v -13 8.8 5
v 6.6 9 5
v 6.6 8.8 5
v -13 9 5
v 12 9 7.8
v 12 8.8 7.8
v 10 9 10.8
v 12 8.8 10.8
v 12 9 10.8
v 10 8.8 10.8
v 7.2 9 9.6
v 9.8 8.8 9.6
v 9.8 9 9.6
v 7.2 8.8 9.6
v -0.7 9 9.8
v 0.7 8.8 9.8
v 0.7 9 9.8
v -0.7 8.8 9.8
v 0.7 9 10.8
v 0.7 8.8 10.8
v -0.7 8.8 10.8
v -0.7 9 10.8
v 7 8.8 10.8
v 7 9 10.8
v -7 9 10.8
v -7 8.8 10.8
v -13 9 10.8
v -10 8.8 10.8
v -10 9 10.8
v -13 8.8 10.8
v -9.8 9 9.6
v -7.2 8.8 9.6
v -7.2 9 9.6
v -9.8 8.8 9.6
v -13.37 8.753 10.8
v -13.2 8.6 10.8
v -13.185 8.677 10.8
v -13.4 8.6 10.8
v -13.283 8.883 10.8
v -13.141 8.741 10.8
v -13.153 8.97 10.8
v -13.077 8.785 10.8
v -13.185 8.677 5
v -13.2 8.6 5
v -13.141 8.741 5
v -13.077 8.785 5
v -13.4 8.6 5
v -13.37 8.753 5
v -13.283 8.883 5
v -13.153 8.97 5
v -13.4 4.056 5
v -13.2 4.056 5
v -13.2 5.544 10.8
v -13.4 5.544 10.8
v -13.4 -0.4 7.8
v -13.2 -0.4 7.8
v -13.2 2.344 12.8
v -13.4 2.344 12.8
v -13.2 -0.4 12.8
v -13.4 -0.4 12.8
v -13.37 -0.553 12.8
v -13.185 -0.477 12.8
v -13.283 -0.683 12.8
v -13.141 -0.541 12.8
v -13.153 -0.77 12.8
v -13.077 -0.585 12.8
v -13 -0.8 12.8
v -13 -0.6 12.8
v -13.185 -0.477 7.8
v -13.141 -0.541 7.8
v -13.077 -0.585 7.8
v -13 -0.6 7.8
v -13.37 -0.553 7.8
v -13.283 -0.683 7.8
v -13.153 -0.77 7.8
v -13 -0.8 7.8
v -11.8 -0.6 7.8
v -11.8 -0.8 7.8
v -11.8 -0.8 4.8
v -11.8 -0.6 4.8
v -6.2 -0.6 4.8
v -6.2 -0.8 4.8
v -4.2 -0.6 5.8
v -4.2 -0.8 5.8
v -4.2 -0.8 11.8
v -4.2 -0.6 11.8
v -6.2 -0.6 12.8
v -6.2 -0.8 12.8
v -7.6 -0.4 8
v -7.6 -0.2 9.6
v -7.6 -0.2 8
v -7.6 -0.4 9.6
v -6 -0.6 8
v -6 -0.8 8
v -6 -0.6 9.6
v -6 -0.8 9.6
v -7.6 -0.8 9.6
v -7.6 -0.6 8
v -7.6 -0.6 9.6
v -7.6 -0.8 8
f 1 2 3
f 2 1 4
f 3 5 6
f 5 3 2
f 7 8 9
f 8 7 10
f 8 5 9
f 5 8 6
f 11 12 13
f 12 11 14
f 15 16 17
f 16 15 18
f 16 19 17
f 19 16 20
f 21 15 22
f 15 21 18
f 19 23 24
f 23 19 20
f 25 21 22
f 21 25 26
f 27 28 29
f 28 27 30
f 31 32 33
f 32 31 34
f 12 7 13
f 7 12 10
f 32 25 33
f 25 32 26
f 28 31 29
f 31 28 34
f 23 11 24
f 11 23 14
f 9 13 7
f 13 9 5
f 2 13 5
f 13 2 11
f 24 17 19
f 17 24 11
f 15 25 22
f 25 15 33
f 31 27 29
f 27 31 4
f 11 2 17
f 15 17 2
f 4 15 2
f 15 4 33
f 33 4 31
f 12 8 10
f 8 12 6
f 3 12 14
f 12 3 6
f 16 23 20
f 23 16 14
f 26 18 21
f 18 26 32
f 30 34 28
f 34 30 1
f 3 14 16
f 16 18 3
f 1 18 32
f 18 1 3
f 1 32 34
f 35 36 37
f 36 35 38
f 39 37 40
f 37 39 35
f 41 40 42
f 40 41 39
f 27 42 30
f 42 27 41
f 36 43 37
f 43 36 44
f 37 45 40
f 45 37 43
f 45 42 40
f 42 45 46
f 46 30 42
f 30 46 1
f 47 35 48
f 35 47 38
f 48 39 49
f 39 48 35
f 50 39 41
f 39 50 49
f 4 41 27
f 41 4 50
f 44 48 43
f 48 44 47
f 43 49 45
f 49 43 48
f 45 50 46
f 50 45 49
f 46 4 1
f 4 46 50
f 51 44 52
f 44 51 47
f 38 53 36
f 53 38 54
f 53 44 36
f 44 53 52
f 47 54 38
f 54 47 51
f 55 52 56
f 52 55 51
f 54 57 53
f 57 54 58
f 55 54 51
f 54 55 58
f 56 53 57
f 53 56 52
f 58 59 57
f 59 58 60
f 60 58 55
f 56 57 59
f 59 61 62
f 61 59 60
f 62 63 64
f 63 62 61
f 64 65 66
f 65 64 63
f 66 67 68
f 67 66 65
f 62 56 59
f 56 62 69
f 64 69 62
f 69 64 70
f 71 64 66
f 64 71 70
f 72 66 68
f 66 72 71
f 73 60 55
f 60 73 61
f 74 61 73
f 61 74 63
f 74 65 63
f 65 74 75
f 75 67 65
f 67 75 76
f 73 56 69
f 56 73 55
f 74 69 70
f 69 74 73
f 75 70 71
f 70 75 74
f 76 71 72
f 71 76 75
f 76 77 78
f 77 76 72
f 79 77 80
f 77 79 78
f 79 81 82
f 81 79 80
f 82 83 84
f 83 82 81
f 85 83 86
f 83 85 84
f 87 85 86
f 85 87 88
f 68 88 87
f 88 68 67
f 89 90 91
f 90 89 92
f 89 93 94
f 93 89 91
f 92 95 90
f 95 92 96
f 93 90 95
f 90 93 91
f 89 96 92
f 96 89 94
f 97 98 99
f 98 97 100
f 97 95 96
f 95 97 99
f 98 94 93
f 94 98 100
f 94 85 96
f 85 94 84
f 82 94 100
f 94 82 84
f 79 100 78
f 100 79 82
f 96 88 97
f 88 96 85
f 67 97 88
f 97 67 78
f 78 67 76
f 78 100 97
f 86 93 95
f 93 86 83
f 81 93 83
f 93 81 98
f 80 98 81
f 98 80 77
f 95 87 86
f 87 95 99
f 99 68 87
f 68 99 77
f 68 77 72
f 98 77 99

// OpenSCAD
// file: ../p/1-4edge.scad
use <../lib.scad>
function ldraw_lib__1_4edge() = [
// 0 Circle 0.25
// 0 Name: 1-4edge.dat
// 0 Author: James Jessiman
// 0 !LDRAW_ORG Primitive UPDATE 2017-01
// 0 !LICENSE Licensed under CC BY 4.0 : see CAreadme.txt
// 
// 0 BFC CERTIFY CCW
  [0,"BFC","CERTIFY"],
  [0,"BFC","CCW"],
// 
// 0 !HISTORY 2007-06-22 [PTadmin] Header formatted for Contributor Agreement
// 0 !HISTORY 2008-07-01 [PTadmin] Official Update 2008-01
// 0 !HISTORY 2017-01-15 [Steffen] BFCed
// 0 !HISTORY 2017-12-30 [PTadmin] Official Update 2017-01
// 
// 
// 2 24 1 0 0 0.9239 0 0.3827
  [2,24,1,0,0,0.9239,0,0.3827],
// 2 24 0.9239 0 0.3827 0.7071 0 0.7071
  [2,24,0.9239,0,0.3827,0.7071,0,0.7071],
// 2 24 0.7071 0 0.7071 0.3827 0 0.9239
  [2,24,0.7071,0,0.7071,0.3827,0,0.9239],
// 2 24 0.3827 0 0.9239 0 0 1
  [2,24,0.3827,0,0.9239,0,0,1],
];
module ldraw_lib__1_4edge(step=0, col=false, unit=2/5, alt=false, line=0.2, solid=!$preview)
    makepoly(ldraw_lib__1_4edge(), step=step, col=col, unit=unit, alt=alt, line=line, solid=solid);
ldraw_lib__1_4edge(line=0.2);
// file: ../p/1-4cyli.scad
use <../lib.scad>
function ldraw_lib__1_4cyli() = [
// 0 Cylinder 0.25
// 0 Name: 1-4cyli.dat
// 0 Author: James Jessiman
// 0 !LDRAW_ORG Primitive UPDATE 2012-01
// 0 !LICENSE Licensed under CC BY 4.0 : see CAreadme.txt
// 
// 0 BFC CERTIFY CCW
  [0,"BFC","CERTIFY"],
  [0,"BFC","CCW"],
// 
// 0 !HISTORY 2002-03-23 [sbliss] Added BFC statement.
// 0 !HISTORY 2002-04-25 [PTadmin] Official Update 2002-02
// 0 !HISTORY 2007-06-22 [PTadmin] Header formatted for Contributor Agreement
// 0 !HISTORY 2008-07-01 [PTadmin] Official Update 2008-01
// 0 !HISTORY 2012-02-16 [Philo] Changed to CCW
// 0 !HISTORY 2012-03-30 [PTadmin] Official Update 2012-01
// 
// 
// 4 16 1 1 0 0.9239 1 0.3827 0.9239 0 0.3827 1 0 0
  [4,16,1,1,0,0.9239,1,0.3827,0.9239,0,0.3827,1,0,0],
// 5 24 1 0 0 1 1 0 0.9239 0 0.3827 1 0 -1
  [5,24,1,0,0,1,1,0,0.9239,0,0.3827,1,0,-1],
// 4 16 0.9239 1 0.3827 0.7071 1 0.7071 0.7071 0 0.7071 0.9239 0 0.3827
  [4,16,0.9239,1,0.3827,0.7071,1,0.7071,0.7071,0,0.7071,0.9239,0,0.3827],
// 5 24 0.9239 0 0.3827 0.9239 1 0.3827 0.7071 0 0.7071 1 0 0
  [5,24,0.9239,0,0.3827,0.9239,1,0.3827,0.7071,0,0.7071,1,0,0],
// 4 16 0.7071 1 0.7071 0.3827 1 0.9239 0.3827 0 0.9239 0.7071 0 0.7071
  [4,16,0.7071,1,0.7071,0.3827,1,0.9239,0.3827,0,0.9239,0.7071,0,0.7071],
// 5 24 0.7071 0 0.7071 0.7071 1 0.7071 0.3827 0 0.9239 0.9239 0 0.3827
  [5,24,0.7071,0,0.7071,0.7071,1,0.7071,0.3827,0,0.9239,0.9239,0,0.3827],
// 4 16 0.3827 1 0.9239 0 1 1 0 0 1 0.3827 0 0.9239
  [4,16,0.3827,1,0.9239,0,1,1,0,0,1,0.3827,0,0.9239],
// 5 24 0.3827 0 0.9239 0.3827 1 0.9239 0 0 1 0.7071 0 0.7071
  [5,24,0.3827,0,0.9239,0.3827,1,0.9239,0,0,1,0.7071,0,0.7071],
// 5 24 0 0 1 0 1 1 0.3827 0 0.9239 -1 0 1
  [5,24,0,0,1,0,1,1,0.3827,0,0.9239,-1,0,1],
];
module ldraw_lib__1_4cyli(step=0, col=false, unit=2/5, alt=false, line=0.2, solid=!$preview)
    makepoly(ldraw_lib__1_4cyli(), step=step, col=col, unit=unit, alt=alt, line=line, solid=solid);
ldraw_lib__1_4cyli(line=0.2);
// file: ../p/rect3.scad
use <../lib.scad>
function ldraw_lib__rect3() = [
// 0 Rectangle with 3 Edges
// 0 Name: rect3.dat
// 0 Author: Mark Kennedy [mkennedy]
// 0 !LDRAW_ORG Primitive UPDATE 2010-01
// 0 !LICENSE Licensed under CC BY 4.0 : see CAreadme.txt
// 
// 0 BFC CERTIFY CCW
  [0,"BFC","CERTIFY"],
  [0,"BFC","CCW"],
// 
// 0 !HISTORY 2003-08-01 [PTadmin] Official Update 2003-02
// 0 !HISTORY 2007-06-24 [PTadmin] Header formatted for Contributor Agreement
// 0 !HISTORY 2008-07-01 [PTadmin] Official Update 2008-01
// 0 !HISTORY 2010-01-17 [mikeheide] Change winding to CCW
// 0 !HISTORY 2010-04-05 [PTadmin] Official Update 2010-01
// 
// 
// 2 24 1 0 1 -1 0 1
  [2,24,1,0,1,-1,0,1],
// 2 24 1 0 1 1 0 -1
  [2,24,1,0,1,1,0,-1],
// 2 24 -1 0 1 -1 0 -1
  [2,24,-1,0,1,-1,0,-1],
// 4 16 -1 0 1 -1 0 -1 1 0 -1 1 0 1
  [4,16,-1,0,1,-1,0,-1,1,0,-1,1,0,1],
// 0 //
];
module ldraw_lib__rect3(step=0, col=false, unit=2/5, alt=false, line=0.2, solid=!$preview)
    makepoly(ldraw_lib__rect3(), step=step, col=col, unit=unit, alt=alt, line=line, solid=solid);
ldraw_lib__rect3(line=0.2);
// file: ../p/rect.scad
use <../lib.scad>
function ldraw_lib__rect() = [
// 0 Rectangle
// 0 Name: rect.dat
// 0 Author: James Jessiman
// 0 !LDRAW_ORG Primitive UPDATE 2010-01
// 0 !LICENSE Licensed under CC BY 4.0 : see CAreadme.txt
// 
// 0 BFC CERTIFY CCW
  [0,"BFC","CERTIFY"],
  [0,"BFC","CCW"],
// 
// 0 !HISTORY 2002-04-05 [hafhead] Added BFC statement
// 0 !HISTORY 2002-04-25 [PTadmin] Official Update 2002-02
// 0 !HISTORY 2007-06-24 [PTadmin] Header formatted for Contributor Agreement
// 0 !HISTORY 2008-07-01 [PTadmin] Official Update 2008-01
// 0 !HISTORY 2010-01-17 [mikeheide] changed winding to CCW
// 0 !HISTORY 2010-04-05 [PTadmin] Official Update 2010-01
// 
// 
// 2 24 1 0 1 -1 0 1
  [2,24,1,0,1,-1,0,1],
// 2 24 -1 0 1 -1 0 -1
  [2,24,-1,0,1,-1,0,-1],
// 2 24 -1 0 -1 1 0 -1
  [2,24,-1,0,-1,1,0,-1],
// 2 24 1 0 -1 1 0 1
  [2,24,1,0,-1,1,0,1],
// 4 16 -1 0 1 -1 0 -1 1 0 -1 1 0 1
  [4,16,-1,0,1,-1,0,-1,1,0,-1,1,0,1],
// 0
];
module ldraw_lib__rect(step=0, col=false, unit=2/5, alt=false, line=0.2, solid=!$preview)
    makepoly(ldraw_lib__rect(), step=step, col=col, unit=unit, alt=alt, line=line, solid=solid);
ldraw_lib__rect(line=0.2);
// file: ../p/box5-2p.scad
use <../lib.scad>
function ldraw_lib__box5_2p() = [
// 0 Box with  5 Faces without  2 Parallel Edges
// 0 Name: box5-2p.dat
// 0 Author: Willy Tschager [Holly-Wood]
// 0 !LDRAW_ORG Primitive UPDATE 2024-01
// 0 !LICENSE Licensed under CC BY 4.0 : see CAreadme.txt
// 
// 0 BFC CERTIFY CCW
  [0,"BFC","CERTIFY"],
  [0,"BFC","CCW"],
// 
// 0 !HISTORY 2012-03-30 [PTadmin] Official Update 2012-01
// 0 !HISTORY 2024-01-04 [Holly-Wood] Complete re-write, original by Brickaneer
// 0 !HISTORY 2024-01-29 [OrionP] Official Update 2024-01
// 
// 2 24 -1 1 1 1 1 1
  [2,24,-1,1,1,1,1,1],
// 2 24 -1 1 -1 -1 1 1
  [2,24,-1,1,-1,-1,1,1],
// 2 24 1 1 -1 -1 1 -1
  [2,24,1,1,-1,-1,1,-1],
// 2 24 1 1 1 1 1 -1
  [2,24,1,1,1,1,1,-1],
// 4 16 1 1 1 1 1 -1 -1 1 -1 -1 1 1
  [4,16,1,1,1,1,1,-1,-1,1,-1,-1,1,1],
// 
// 2 24 -1 1 1 -1 0 1
  [2,24,-1,1,1,-1,0,1],
// 2 24 -1 1 -1 -1 0 -1
  [2,24,-1,1,-1,-1,0,-1],
// 2 24 -1 0 -1 -1 0 1
  [2,24,-1,0,-1,-1,0,1],
// 4 16 -1 1 1 -1 1 -1 -1 0 -1 -1 0 1
  [4,16,-1,1,1,-1,1,-1,-1,0,-1,-1,0,1],
// 
// 2 24 1 1 1 1 0 1
  [2,24,1,1,1,1,0,1],
// 2 24 1 1 -1 1 0 -1
  [2,24,1,1,-1,1,0,-1],
// 2 24 1 0 1 1 0 -1
  [2,24,1,0,1,1,0,-1],
// 4 16 1 1 -1 1 1 1 1 0 1 1 0 -1
  [4,16,1,1,-1,1,1,1,1,0,1,1,0,-1],
// 
// 4 16 1 1 1 -1 1 1 -1 0 1 1 0 1
  [4,16,1,1,1,-1,1,1,-1,0,1,1,0,1],
// 4 16 -1 1 -1 1 1 -1 1 0 -1 -1 0 -1
  [4,16,-1,1,-1,1,1,-1,1,0,-1,-1,0,-1],
];
module ldraw_lib__box5_2p(step=0, col=false, unit=2/5, alt=false, line=0.2, solid=!$preview)
    makepoly(ldraw_lib__box5_2p(), step=step, col=col, unit=unit, alt=alt, line=line, solid=solid);
ldraw_lib__box5_2p(line=0.2);
// file: ../p/box3u4a.scad
use <../lib.scad>
function ldraw_lib__box3u4a() = [
// 0 Box with 3 Faces without 4 Adjacent Edges
// 0 Name: box3u4a.dat
// 0 Author: Niels Karsdorp [nielsk]
// 0 !LDRAW_ORG Primitive UPDATE 2009-01
// 0 !LICENSE Licensed under CC BY 4.0 : see CAreadme.txt
// 
// 0 BFC CERTIFY CCW
  [0,"BFC","CERTIFY"],
  [0,"BFC","CCW"],
// 
// 0 !HISTORY 2009-05-02 [PTadmin] Official Update 2009-01
// 
// 
// 2 24 1 1 1 -1 1 1
  [2,24,1,1,1,-1,1,1],
// 2 24 -1 1 -1 1 1 -1
  [2,24,-1,1,-1,1,1,-1],
// 2 24 1 1 1 1 1 -1
  [2,24,1,1,1,1,1,-1],
// 2 24 -1 1 1 -1 1 -1
  [2,24,-1,1,1,-1,1,-1],
// 2 24 1 1 1 1 0 1
  [2,24,1,1,1,1,0,1],
// 2 24 1 1 -1 1 0 -1
  [2,24,1,1,-1,1,0,-1],
// 2 24 -1 1 1 -1 0 1
  [2,24,-1,1,1,-1,0,1],
// 2 24 -1 1 -1 -1 0 -1
  [2,24,-1,1,-1,-1,0,-1],
// 4 16 -1 1 -1 -1 1 1 1 1 1 1 1 -1
  [4,16,-1,1,-1,-1,1,1,1,1,1,1,1,-1],
// 4 16 -1 1 1 -1 0 1 1 0 1 1 1 1
  [4,16,-1,1,1,-1,0,1,1,0,1,1,1,1],
// 4 16 1 1 -1 1 0 -1 -1 0 -1 -1 1 -1
  [4,16,1,1,-1,1,0,-1,-1,0,-1,-1,1,-1],
// 0
];
module ldraw_lib__box3u4a(step=0, col=false, unit=2/5, alt=false, line=0.2, solid=!$preview)
    makepoly(ldraw_lib__box3u4a(), step=step, col=col, unit=unit, alt=alt, line=line, solid=solid);
ldraw_lib__box3u4a(line=0.2);
// file: ../p/box3u2p.scad
use <../lib.scad>
function ldraw_lib__box3u2p() = [
// 0 Box with 3 Faces without 2 Parallel Edges
// 0 Name: box3u2p.dat
// 0 Author: Niels Karsdorp [nielsk]
// 0 !LDRAW_ORG Primitive UPDATE 2012-01
// 0 !LICENSE Licensed under CC BY 4.0 : see CAreadme.txt
// 
// 0 BFC CERTIFY CCW
  [0,"BFC","CERTIFY"],
  [0,"BFC","CCW"],
// 
// 0 !HISTORY 2003-03-12 [PTadmin] Official Update 2003-01
// 0 !HISTORY 2007-06-24 [PTadmin] Header formatted for Contributor Agreement
// 0 !HISTORY 2008-07-01 [PTadmin] Official Update 2008-01
// 0 !HISTORY 2012-02-16 [Philo] Changed to CCW
// 0 !HISTORY 2012-03-30 [PTadmin] Official Update 2012-01
// 
// 
// 2 24 1 1 1 -1 1 1
  [2,24,1,1,1,-1,1,1],
// 2 24 -1 1 -1 1 1 -1
  [2,24,-1,1,-1,1,1,-1],
// 2 24 1 0 1 -1 0 1
  [2,24,1,0,1,-1,0,1],
// 2 24 -1 0 -1 1 0 -1
  [2,24,-1,0,-1,1,0,-1],
// 2 24 1 1 1 1 1 -1
  [2,24,1,1,1,1,1,-1],
// 2 24 -1 1 1 -1 1 -1
  [2,24,-1,1,1,-1,1,-1],
// 2 24 1 1 1 1 0 1
  [2,24,1,1,1,1,0,1],
// 2 24 1 1 -1 1 0 -1
  [2,24,1,1,-1,1,0,-1],
// 2 24 -1 1 1 -1 0 1
  [2,24,-1,1,1,-1,0,1],
// 2 24 -1 1 -1 -1 0 -1
  [2,24,-1,1,-1,-1,0,-1],
// 4 16 -1 1 -1 -1 1 1 1 1 1 1 1 -1
  [4,16,-1,1,-1,-1,1,1,1,1,1,1,1,-1],
// 4 16 -1 1 1 -1 0 1 1 0 1 1 1 1
  [4,16,-1,1,1,-1,0,1,1,0,1,1,1,1],
// 4 16 1 1 -1 1 0 -1 -1 0 -1 -1 1 -1
  [4,16,1,1,-1,1,0,-1,-1,0,-1,-1,1,-1],
];
module ldraw_lib__box3u2p(step=0, col=false, unit=2/5, alt=false, line=0.2, solid=!$preview)
    makepoly(ldraw_lib__box3u2p(), step=step, col=col, unit=unit, alt=alt, line=line, solid=solid);
ldraw_lib__box3u2p(line=0.2);
// file: ../p/box2-7.scad
use <../lib.scad>
function ldraw_lib__box2_7() = [
// 0 Box with  2 Faces without  7 Edges
// 0 Name: box2-7.dat
// 0 Author: Willy Tschager [Holly-Wood]
// 0 !LDRAW_ORG Primitive UPDATE 2024-01
// 0 !LICENSE Licensed under CC BY 4.0 : see CAreadme.txt
// 
// 0 BFC CERTIFY CCW
  [0,"BFC","CERTIFY"],
  [0,"BFC","CCW"],
// 
// 0 !HISTORY 2009-05-02 [PTadmin] Official Update 2009-01
// 0 !HISTORY 2024-01-02 [Holly-Wood] Complete re-write, original by guyvivan
// 0 !HISTORY 2024-01-29 [OrionP] Official Update 2024-01
// 
// 2 24 -1 1 -1 -1 1 1
  [2,24,-1,1,-1,-1,1,1],
// 2 24 1 1 1 1 1 -1
  [2,24,1,1,1,1,1,-1],
// 4 16 -1 1 1 1 1 1 1 1 -1 -1 1 -1
  [4,16,-1,1,1,1,1,1,1,1,-1,-1,1,-1],
// 
// 2 24 -1 1 1 -1 -1 1
  [2,24,-1,1,1,-1,-1,1],
// 2 24 1 1 1 1 -1 1
  [2,24,1,1,1,1,-1,1],
// 4 16 1 -1 1 1 1 1 -1 1 1 -1 -1 1
  [4,16,1,-1,1,1,1,1,-1,1,1,-1,-1,1],
// 
// 2 24 -1 1 1 1 1 1
  [2,24,-1,1,1,1,1,1],
];
module ldraw_lib__box2_7(step=0, col=false, unit=2/5, alt=false, line=0.2, solid=!$preview)
    makepoly(ldraw_lib__box2_7(), step=step, col=col, unit=unit, alt=alt, line=line, solid=solid);
ldraw_lib__box2_7(line=0.2);
// file: ../p/box2-5.scad
use <../lib.scad>
function ldraw_lib__box2_5() = [
// 0 Box with 2 Faces without 5 Edges
// 0 Name: box2-5.dat
// 0 Author: Steffen [Steffen]
// 0 !LDRAW_ORG Primitive UPDATE 2003-03
// 0 !LICENSE Licensed under CC BY 4.0 : see CAreadme.txt
// 
// 0 BFC CERTIFY CCW
  [0,"BFC","CERTIFY"],
  [0,"BFC","CCW"],
// 
// 0 !HISTORY 2003-12-19 [PTadmin] Official Update 2003-03
// 0 !HISTORY 2007-06-24 [PTadmin] Header formatted for Contributor Agreement
// 0 !HISTORY 2008-07-01 [PTadmin] Official Update 2008-01
// 
// 
// 2 24 1 1 1 -1 1 1
  [2,24,1,1,1,-1,1,1],
// 2 24 1 1 -1 -1 1 -1
  [2,24,1,1,-1,-1,1,-1],
// 2 24 1 -1 1 -1 -1 1
  [2,24,1,-1,1,-1,-1,1],
// 2 24 -1 -1 1 -1 1 1
  [2,24,-1,-1,1,-1,1,1],
// 2 24 1 -1 1 1 1 1
  [2,24,1,-1,1,1,1,1],
// 2 24 -1 1 -1 -1 1 1
  [2,24,-1,1,-1,-1,1,1],
// 2 24 1 1 -1 1 1 1
  [2,24,1,1,-1,1,1,1],
// 4 16 1 1 1 1 1 -1 -1 1 -1 -1 1 1
  [4,16,1,1,1,1,1,-1,-1,1,-1,-1,1,1],
// 4 16 1 1 1 -1 1 1 -1 -1 1 1 -1 1
  [4,16,1,1,1,-1,1,1,-1,-1,1,1,-1,1],
// 0
];
module ldraw_lib__box2_5(step=0, col=false, unit=2/5, alt=false, line=0.2, solid=!$preview)
    makepoly(ldraw_lib__box2_5(), step=step, col=col, unit=unit, alt=alt, line=line, solid=solid);
ldraw_lib__box2_5(line=0.2);
// file: ../p/1-4ring1.scad
use <../lib.scad>
function ldraw_lib__1_4ring1() = [
// 0 Ring  1 x 0.25
// 0 Name: 1-4ring1.dat
// 0 Author: Chris Dee [cwdee]
// 0 !LDRAW_ORG Primitive UPDATE 2012-01
// 0 !LICENSE Licensed under CC BY 4.0 : see CAreadme.txt
// 
// 0 BFC CERTIFY CCW
  [0,"BFC","CERTIFY"],
  [0,"BFC","CCW"],
// 
// 0 !HISTORY 2000-05-07 [PTadmin] Official Update 2000-01
// 0 !HISTORY 2002-11-22 [hafhead] Added BFC statement
// 0 !HISTORY 2002-11-30 [PTadmin] Official Update 2002-05
// 0 !HISTORY 2007-06-22 [PTadmin] Header formatted for Contributor Agreement
// 0 !HISTORY 2008-07-01 [PTadmin] Official Update 2008-01
// 0 !HISTORY 2012-02-16 [Philo] Changed to CCW
// 0 !HISTORY 2012-03-30 [PTadmin] Official Update 2012-01
// 
// 
// 4 16 2 0 0 1.8478 0 0.7654 0.9239 0 0.3827 1 0 0
  [4,16,2,0,0,1.8478,0,0.7654,0.9239,0,0.3827,1,0,0],
// 4 16 1.8478 0 0.7654 1.4142 0 1.4142 0.7071 0 0.7071 0.9239 0 0.3827
  [4,16,1.8478,0,0.7654,1.4142,0,1.4142,0.7071,0,0.7071,0.9239,0,0.3827],
// 4 16 1.4142 0 1.4142 0.7654 0 1.8478 0.3827 0 0.9239 0.7071 0 0.7071
  [4,16,1.4142,0,1.4142,0.7654,0,1.8478,0.3827,0,0.9239,0.7071,0,0.7071],
// 4 16 0.7654 0 1.8478 0 0 2 0 0 1 0.3827 0 0.9239
  [4,16,0.7654,0,1.8478,0,0,2,0,0,1,0.3827,0,0.9239],
];
module ldraw_lib__1_4ring1(step=0, col=false, unit=2/5, alt=false, line=0.2, solid=!$preview)
    makepoly(ldraw_lib__1_4ring1(), step=step, col=col, unit=unit, alt=alt, line=line, solid=solid);
ldraw_lib__1_4ring1(line=0.2);
// file: ../p/1-4cylo.scad
use <../lib.scad>
use <1-4cyli.scad>
use <1-4edge.scad>
function ldraw_lib__1_4cylo() = [
// 0 Cylinder Open 0.25
// 0 Name: 1-4cylo.dat
// 0 Author: Max Martin Richter [MMR1988]
// 0 !LDRAW_ORG Primitive UPDATE 2010-03
// 0 !LICENSE Licensed under CC BY 4.0 : see CAreadme.txt
// 
// 0 BFC CERTIFY CCW
  [0,"BFC","CERTIFY"],
  [0,"BFC","CCW"],
// 
// 0 !HISTORY 2010-12-31 [PTadmin] Official Update 2010-03
// 
// 
// 1 16 0 0 0 1 0 0 0 1 0 0 0 1 1-4edge.dat
  [1,16,0,0,0,1,0,0,0,1,0,0,0,1, ldraw_lib__1_4edge()],
// 1 16 0 1 0 1 0 0 0 1 0 0 0 1 1-4edge.dat
  [1,16,0,1,0,1,0,0,0,1,0,0,0,1, ldraw_lib__1_4edge()],
// 1 16 0 0 0 1 0 0 0 1 0 0 0 1 1-4cyli.dat
  [1,16,0,0,0,1,0,0,0,1,0,0,0,1, ldraw_lib__1_4cyli()],
];
module ldraw_lib__1_4cylo(step=0, col=false, unit=2/5, alt=false, line=0.2, solid=!$preview)
    makepoly(ldraw_lib__1_4cylo(), step=step, col=col, unit=unit, alt=alt, line=line, solid=solid);
ldraw_lib__1_4cylo(line=0.2);
// main file
use <../lib.scad>
use <../p/1-4cylo.scad>
use <../p/1-4ring1.scad>
use <../p/box2-5.scad>
use <../p/box2-7.scad>
use <../p/box3u2p.scad>
use <../p/box3u4a.scad>
use <../p/box5-2p.scad>
use <../p/rect.scad>
use <../p/rect3.scad>
function ldraw_lib__u9645() = [
// 0 ~Electric 9V Battery Box  4 x 14 x  4 Bottom - Contact Positive
// 0 Name: u9645.dat
// 0 Author: Gerald Lasser [GeraldLasser]
// 0 !LDRAW_ORG Part UPDATE 2024-08
// 0 !LICENSE Licensed under CC BY 4.0 : see CAreadme.txt
// 
// 0 BFC CERTIFY CCW
  [0,"BFC","CERTIFY"],
  [0,"BFC","CCW"],
// 
// 0 !HISTORY 2024-09-30 [OrionP] Official Update 2024-08
// 
// 1 16 -8 -12.5 22.25 0 0 24.5 0 -1 0 .25 0 0 rect3.dat
  [1,16,-8,-12.5,22.25,0,0,24.5,0,-1,0,.25,0,0, ldraw_lib__rect3()],
// 4 16 16.5 -12.5 22 16.5 -12.5 22.5 30 -19.5 22.5 30 -19.5 22
  [4,16,16.5,-12.5,22,16.5,-12.5,22.5,30,-19.5,22.5,30,-19.5,22],
// 2 24 16.5 -12.5 22.5 30 -19.5 22.5
  [2,24,16.5,-12.5,22.5,30,-19.5,22.5],
// 2 24 16.5 -12.5 22 30 -19.5 22
  [2,24,16.5,-12.5,22,30,-19.5,22],
// 1 16 27.5 -23.25 22.25 0 0 2.5 0 -3.75 0 .25 0 0 box2-5.dat
  [1,16,27.5,-23.25,22.25,0,0,2.5,0,-3.75,0,.25,0,0, ldraw_lib__box2_5()],
// 1 16 21.25 -24 22.25 0 0 3.25 0 1 0 -.25 0 0 rect.dat
  [1,16,21.25,-24,22.25,0,0,3.25,0,1,0,-.25,0,0, ldraw_lib__rect()],
// 0 BFC INVERTNEXT
  [0,"BFC","INVERTNEXT"],
// 1 16 0 -27 22.25 0 0 1.75 0 2.5 0 -.25 0 0 box3u2p.dat
  [1,16,0,-27,22.25,0,0,1.75,0,2.5,0,-.25,0,0, ldraw_lib__box3u2p()],
// 1 16 9.625 -27 22.25 0 0 7.875 0 1 0 -.25 0 0 rect3.dat
  [1,16,9.625,-27,22.25,0,0,7.875,0,1,0,-.25,0,0, ldraw_lib__rect3()],
// 1 16 -9.625 -27 22.25 0 0 -7.875 0 1 0 -.25 0 0 rect3.dat
  [1,16,-9.625,-27,22.25,0,0,-7.875,0,1,0,-.25,0,0, ldraw_lib__rect3()],
// 1 16 -28.75 -27 22.25 0 0 3.75 0 1 0 -.25 0 0 rect3.dat
  [1,16,-28.75,-27,22.25,0,0,3.75,0,1,0,-.25,0,0, ldraw_lib__rect3()],
// 1 16 -21.25 -24 22.25 3.25 0 0 0 1 0 0 0 .25 rect.dat
  [1,16,-21.25,-24,22.25,3.25,0,0,0,1,0,0,0,.25, ldraw_lib__rect()],
// 4 16 24.5 -24 22.5 24.5 -24 22 25 -27 22 25 -27 22.5
  [4,16,24.5,-24,22.5,24.5,-24,22,25,-27,22,25,-27,22.5],
// 4 16 -18 -24 22.5 -18 -24 22 -17.5 -27 22 -17.5 -27 22.5
  [4,16,-18,-24,22.5,-18,-24,22,-17.5,-27,22,-17.5,-27,22.5],
// 4 16 -25 -27 22 -24.5 -24 22 -24.5 -24 22.5 -25 -27 22.5
  [4,16,-25,-27,22,-24.5,-24,22,-24.5,-24,22.5,-25,-27,22.5],
// 4 16 17.5 -27 22.5 17.5 -27 22 18 -24 22 18 -24 22.5
  [4,16,17.5,-27,22.5,17.5,-27,22,18,-24,22,18,-24,22.5],
// 2 24 18 -24 22.5 17.5 -27 22.5
  [2,24,18,-24,22.5,17.5,-27,22.5],
// 2 24 17.5 -27 22 18 -24 22
  [2,24,17.5,-27,22,18,-24,22],
// 2 24 24.5 -24 22.5 25 -27 22.5
  [2,24,24.5,-24,22.5,25,-27,22.5],
// 2 24 25 -27 22 24.5 -24 22
  [2,24,25,-27,22,24.5,-24,22],
// 2 24 -18 -24 22.5 -17.5 -27 22.5
  [2,24,-18,-24,22.5,-17.5,-27,22.5],
// 2 24 -25 -27 22.5 -24.5 -24 22.5
  [2,24,-25,-27,22.5,-24.5,-24,22.5],
// 2 24 -25 -27 22 -24.5 -24 22
  [2,24,-25,-27,22,-24.5,-24,22],
// 2 24 -18 -24 22 -17.5 -27 22
  [2,24,-18,-24,22,-17.5,-27,22],
// 
// 4 16 24.5 -24 22.5 25 -27 22.5 30 -27 22.5 30 -19.5 22.5
  [4,16,24.5,-24,22.5,25,-27,22.5,30,-27,22.5,30,-19.5,22.5],
// 4 16 18 -24 22.5 24.5 -24 22.5 30 -19.5 22.5 16.5 -12.5 22.5
  [4,16,18,-24,22.5,24.5,-24,22.5,30,-19.5,22.5,16.5,-12.5,22.5],
// 4 16 17.5 -27 22.5 18 -24 22.5 1.75 -24.5 22.5 1.75 -27 22.5
  [4,16,17.5,-27,22.5,18,-24,22.5,1.75,-24.5,22.5,1.75,-27,22.5],
// 4 16 -17.5 -27 22.5 -1.75 -27 22.5 -1.75 -24.5 22.5 -18 -24 22.5
  [4,16,-17.5,-27,22.5,-1.75,-27,22.5,-1.75,-24.5,22.5,-18,-24,22.5],
// 4 16 -32.5 -27 22.5 -25 -27 22.5 -24.5 -24 22.5 -32.5 -12.5 22.5
  [4,16,-32.5,-27,22.5,-25,-27,22.5,-24.5,-24,22.5,-32.5,-12.5,22.5],
// 3 16 18 -24 22.5 16.5 -12.5 22.5 1.75 -24.5 22.5
  [3,16,18,-24,22.5,16.5,-12.5,22.5,1.75,-24.5,22.5],
// 3 16 -1.75 -24.5 22.5 1.75 -24.5 22.5 16.5 -12.5 22.5
  [3,16,-1.75,-24.5,22.5,1.75,-24.5,22.5,16.5,-12.5,22.5],
// 4 16 -1.75 -24.5 22.5 16.5 -12.5 22.5 -32.5 -12.5 22.5 -18 -24 22.5
  [4,16,-1.75,-24.5,22.5,16.5,-12.5,22.5,-32.5,-12.5,22.5,-18,-24,22.5],
// 3 16 -18 -24 22.5 -32.5 -12.5 22.5 -24.5 -24 22.5
  [3,16,-18,-24,22.5,-32.5,-12.5,22.5,-24.5,-24,22.5],
// 
// 4 16 30 -27 22 25 -27 22 24.5 -24 22 30 -19.5 22
  [4,16,30,-27,22,25,-27,22,24.5,-24,22,30,-19.5,22],
// 4 16 30 -19.5 22 24.5 -24 22 18 -24 22 16.5 -12.5 22
  [4,16,30,-19.5,22,24.5,-24,22,18,-24,22,16.5,-12.5,22],
// 4 16 1.75 -24.5 22 18 -24 22 17.5 -27 22 1.75 -27 22
  [4,16,1.75,-24.5,22,18,-24,22,17.5,-27,22,1.75,-27,22],
// 4 16 -1.75 -24.5 22 -1.75 -27 22 -17.5 -27 22 -18 -24 22
  [4,16,-1.75,-24.5,22,-1.75,-27,22,-17.5,-27,22,-18,-24,22],
// 4 16 -24.5 -24 22 -25 -27 22 -32.5 -27 22 -32.5 -12.5 22
  [4,16,-24.5,-24,22,-25,-27,22,-32.5,-27,22,-32.5,-12.5,22],
// 3 16 16.5 -12.5 22 18 -24 22 1.75 -24.5 22
  [3,16,16.5,-12.5,22,18,-24,22,1.75,-24.5,22],
// 3 16 1.75 -24.5 22 -1.75 -24.5 22 16.5 -12.5 22
  [3,16,1.75,-24.5,22,-1.75,-24.5,22,16.5,-12.5,22],
// 4 16 -32.5 -12.5 22 16.5 -12.5 22 -1.75 -24.5 22 -18 -24 22
  [4,16,-32.5,-12.5,22,16.5,-12.5,22,-1.75,-24.5,22,-18,-24,22],
// 3 16 -32.5 -12.5 22 -18 -24 22 -24.5 -24 22
  [3,16,-32.5,-12.5,22,-18,-24,22,-24.5,-24,22],
// 
// 1 16 -32.5 -27 21.5 -.5 0 0 0 1 0 0 0 .5 1-4ring1.dat
  [1,16,-32.5,-27,21.5,-.5,0,0,0,1,0,0,0,.5, ldraw_lib__1_4ring1()],
// 0 BFC INVERTNEXT
  [0,"BFC","INVERTNEXT"],
// 1 16 -32.5 -27 21.5 -.5 0 0 0 14.5 0 0 0 .5 1-4cylo.dat
  [1,16,-32.5,-27,21.5,-.5,0,0,0,14.5,0,0,0,.5, ldraw_lib__1_4cylo()],
// 1 16 -32.5 -27 21.5 -1 0 0 0 14.5 0 0 0 1 1-4cylo.dat
  [1,16,-32.5,-27,21.5,-1,0,0,0,14.5,0,0,0,1, ldraw_lib__1_4cylo()],
// 1 16 -32.5 -12.5 21.5 -.5 0 0 0 -1 0 0 0 .5 1-4ring1.dat
  [1,16,-32.5,-12.5,21.5,-.5,0,0,0,-1,0,0,0,.5, ldraw_lib__1_4ring1()],
// 
// 1 16 -33.25 -12.5 15.82 .25 0 0 0 -1 0 0 0 -5.68 rect3.dat
  [1,16,-33.25,-12.5,15.82,.25,0,0,0,-1,0,0,0,-5.68, ldraw_lib__rect3()],
// 1 16 -33.25 -27 17.68 -.25 0 0 0 1 0 0 0 -3.82 rect3.dat
  [1,16,-33.25,-27,17.68,-.25,0,0,0,1,0,0,0,-3.82, ldraw_lib__rect3()],
// 4 16 -33 -27 13.86 -33 -12.5 10.14 -33 -12.5 21.5 -33 -27 21.5
  [4,16,-33,-27,13.86,-33,-12.5,10.14,-33,-12.5,21.5,-33,-27,21.5],
// 4 16 -33.5 -12.5 10.14 -33.5 -27 13.86 -33.5 -27 21.5 -33.5 -12.5 21.5
  [4,16,-33.5,-12.5,10.14,-33.5,-27,13.86,-33.5,-27,21.5,-33.5,-12.5,21.5],
// 
// 4 16 -33.5 -12.5 10.14 -33 -12.5 10.14 -33 -19.5 -1 -33.5 -19.5 -1
  [4,16,-33.5,-12.5,10.14,-33,-12.5,10.14,-33,-19.5,-1,-33.5,-19.5,-1],
// 4 16 -33 -27 13.86 -33.5 -27 13.86 -33.5 -32 5.86 -33 -32 5.86
  [4,16,-33,-27,13.86,-33.5,-27,13.86,-33.5,-32,5.86,-33,-32,5.86],
// 4 16 -33.5 -32 5.86 -33.5 -27 13.86 -33.5 -12.5 10.14 -33.5 -19.5 -1
  [4,16,-33.5,-32,5.86,-33.5,-27,13.86,-33.5,-12.5,10.14,-33.5,-19.5,-1],
// 4 16 -33 -32 5.86 -33 -19.5 -1 -33 -12.5 10.14 -33 -27 13.86
  [4,16,-33,-32,5.86,-33,-19.5,-1,-33,-12.5,10.14,-33,-27,13.86],
// 2 24 -33 -27 13.86 -33 -32 5.86
  [2,24,-33,-27,13.86,-33,-32,5.86],
// 2 24 -33.5 -27 13.86 -33.5 -32 5.86
  [2,24,-33.5,-27,13.86,-33.5,-32,5.86],
// 2 24 -33.5 -19.5 -1 -33.5 -12.5 10.14
  [2,24,-33.5,-19.5,-1,-33.5,-12.5,10.14],
// 2 24 -33 -12.5 10.14 -33 -19.5 -1
  [2,24,-33,-12.5,10.14,-33,-19.5,-1],
// 2 24 -33.5 -19.5 -1 -33 -19.5 -1
  [2,24,-33.5,-19.5,-1,-33,-19.5,-1],
// 
// 1 16 -33.25 -32 2.43 .25 0 0 0 1 0 0 0 3.43 rect3.dat
  [1,16,-33.25,-32,2.43,.25,0,0,0,1,0,0,0,3.43, ldraw_lib__rect3()],
// 3 16 -33.5 -32 -1 -33.5 -32 5.86 -33.5 -19.5 -1
  [3,16,-33.5,-32,-1,-33.5,-32,5.86,-33.5,-19.5,-1],
// 3 16 -33 -19.5 -1 -33 -32 5.86 -33 -32 -1
  [3,16,-33,-19.5,-1,-33,-32,5.86,-33,-32,-1],
// 
// 1 16 -32.5 -32 -1 -.5 0 0 0 1 0 0 0 -.5 1-4ring1.dat
  [1,16,-32.5,-32,-1,-.5,0,0,0,1,0,0,0,-.5, ldraw_lib__1_4ring1()],
// 0 BFC INVERTNEXT
  [0,"BFC","INVERTNEXT"],
// 1 16 -32.5 -32 -1 -.5 0 0 0 12.5 0 0 0 -.5 1-4cylo.dat
  [1,16,-32.5,-32,-1,-.5,0,0,0,12.5,0,0,0,-.5, ldraw_lib__1_4cylo()],
// 1 16 -32.5 -32 -1 -1 0 0 0 12.5 0 0 0 -1 1-4cylo.dat
  [1,16,-32.5,-32,-1,-1,0,0,0,12.5,0,0,0,-1, ldraw_lib__1_4cylo()],
// 1 16 -32.5 -19.5 -1 -.5 0 0 0 -1 0 0 0 -.5 1-4ring1.dat
  [1,16,-32.5,-19.5,-1,-.5,0,0,0,-1,0,0,0,-.5, ldraw_lib__1_4ring1()],
// 
// 0 BFC INVERTNEXT
  [0,"BFC","INVERTNEXT"],
// 1 16 -31 -15.75 -1.75 0 0 1.5 0 -3.75 0 -.25 0 0 box2-7.dat
  [1,16,-31,-15.75,-1.75,0,0,1.5,0,-3.75,0,-.25,0,0, ldraw_lib__box2_7()],
// 1 16 -22.5 -12 -1.75 0 0 -7 0 -1 0 -.25 0 0 rect.dat
  [1,16,-22.5,-12,-1.75,0,0,-7,0,-1,0,-.25,0,0, ldraw_lib__rect()],
// 4 16 -10.5 -14.5 -2 -15.5 -12 -2 -15.5 -12 -1.5 -10.5 -14.5 -1.5
  [4,16,-10.5,-14.5,-2,-15.5,-12,-2,-15.5,-12,-1.5,-10.5,-14.5,-1.5],
// 2 24 -15.5 -12 -1.5 -10.5 -14.5 -1.5
  [2,24,-15.5,-12,-1.5,-10.5,-14.5,-1.5],
// 2 24 -10.5 -14.5 -2 -15.5 -12 -2
  [2,24,-10.5,-14.5,-2,-15.5,-12,-2],
// 1 16 -10.5 -22 -1.75 0 -1 0 0 0 -7.5 .25 0 0 rect.dat
  [1,16,-10.5,-22,-1.75,0,-1,0,0,0,-7.5,.25,0,0, ldraw_lib__rect()],
// 4 16 -15.5 -32 -1.5 -15.5 -32 -2 -10.5 -29.5 -2 -10.5 -29.5 -1.5
  [4,16,-15.5,-32,-1.5,-15.5,-32,-2,-10.5,-29.5,-2,-10.5,-29.5,-1.5],
// 2 24 -15.5 -32 -1.5 -10.5 -29.5 -1.5
  [2,24,-15.5,-32,-1.5,-10.5,-29.5,-1.5],
// 2 24 -10.5 -29.5 -2 -15.5 -32 -2
  [2,24,-10.5,-29.5,-2,-15.5,-32,-2],
// 1 16 -24 -32 -1.75 0 0 8.5 0 1 0 -.25 0 0 rect3.dat
  [1,16,-24,-32,-1.75,0,0,8.5,0,1,0,-.25,0,0, ldraw_lib__rect3()],
// 
// 1 16 -15 -22 -1.75 0 -4 0 -2 0 0 0 1 .25 box5-2p.dat
  [1,16,-15,-22,-1.75,0,-4,0,-2,0,0,0,1,.25, ldraw_lib__box5_2p()],
// 0 BFC INVERTNEXT
  [0,"BFC","INVERTNEXT"],
// 1 16 -15 -22 -1.75 0 -4 0 0 0 -2 -.25 0 0 box3u4a.dat
  [1,16,-15,-22,-1.75,0,-4,0,0,0,-2,-.25,0,0, ldraw_lib__box3u4a()],
// 
// 4 16 -10.5 -29.5 -2 -15 -24 -2 -15 -20 -2 -10.5 -14.5 -2
  [4,16,-10.5,-29.5,-2,-15,-24,-2,-15,-20,-2,-10.5,-14.5,-2],
// 4 16 -15.5 -12 -2 -10.5 -14.5 -2 -15 -20 -2 -19 -20 -2
  [4,16,-15.5,-12,-2,-10.5,-14.5,-2,-15,-20,-2,-19,-20,-2],
// 4 16 -29.5 -12 -2 -15.5 -12 -2 -19 -20 -2 -29.5 -19.5 -2
  [4,16,-29.5,-12,-2,-15.5,-12,-2,-19,-20,-2,-29.5,-19.5,-2],
// 4 16 -15 -24 -2 -10.5 -29.5 -2 -15.5 -32 -2 -19 -24 -2
  [4,16,-15,-24,-2,-10.5,-29.5,-2,-15.5,-32,-2,-19,-24,-2],
// 4 16 -19 -24 -2 -15.5 -32 -2 -32.5 -32 -2 -29.5 -19.5 -2
  [4,16,-19,-24,-2,-15.5,-32,-2,-32.5,-32,-2,-29.5,-19.5,-2],
// 3 16 -29.5 -19.5 -2 -32.5 -32 -2 -32.5 -19.5 -2
  [3,16,-29.5,-19.5,-2,-32.5,-32,-2,-32.5,-19.5,-2],
// 3 16 -29.5 -19.5 -2 -19 -20 -2 -19 -24 -2
  [3,16,-29.5,-19.5,-2,-19,-20,-2,-19,-24,-2],
// 
// 4 16 -15 -20 -1.5 -15 -24 -1.5 -10.5 -29.5 -1.5 -10.5 -14.5 -1.5
  [4,16,-15,-20,-1.5,-15,-24,-1.5,-10.5,-29.5,-1.5,-10.5,-14.5,-1.5],
// 4 16 -15 -20 -1.5 -10.5 -14.5 -1.5 -15.5 -12 -1.5 -19 -20 -1.5
  [4,16,-15,-20,-1.5,-10.5,-14.5,-1.5,-15.5,-12,-1.5,-19,-20,-1.5],
// 4 16 -19 -20 -1.5 -15.5 -12 -1.5 -29.5 -12 -1.5 -29.5 -19.5 -1.5
  [4,16,-19,-20,-1.5,-15.5,-12,-1.5,-29.5,-12,-1.5,-29.5,-19.5,-1.5],
// 4 16 -15.5 -32 -1.5 -10.5 -29.5 -1.5 -15 -24 -1.5 -19 -24 -1.5
  [4,16,-15.5,-32,-1.5,-10.5,-29.5,-1.5,-15,-24,-1.5,-19,-24,-1.5],
// 4 16 -32.5 -32 -1.5 -15.5 -32 -1.5 -19 -24 -1.5 -29.5 -19.5 -1.5
  [4,16,-32.5,-32,-1.5,-15.5,-32,-1.5,-19,-24,-1.5,-29.5,-19.5,-1.5],
// 3 16 -32.5 -32 -1.5 -29.5 -19.5 -1.5 -32.5 -19.5 -1.5
  [3,16,-32.5,-32,-1.5,-29.5,-19.5,-1.5,-32.5,-19.5,-1.5],
// 3 16 -19 -20 -1.5 -29.5 -19.5 -1.5 -19 -24 -1.5
  [3,16,-19,-20,-1.5,-29.5,-19.5,-1.5,-19,-24,-1.5],
// 
// 5 24 -15 -24 -2 -15 -20 -2 -10.5 -14.5 -2 -19 -24 -1
  [5,24,-15,-24,-2,-15,-20,-2,-10.5,-14.5,-2,-19,-24,-1],
// 5 24 -15 -20 -1.5 -15 -24 -1.5 -19 -24 -.5 -10.5 -14.5 -1.5
  [5,24,-15,-20,-1.5,-15,-24,-1.5,-19,-24,-.5,-10.5,-14.5,-1.5],
];
module ldraw_lib__u9645(step=0, col=false, unit=2/5, alt=false, line=0.2, solid=!$preview)
    makepoly(ldraw_lib__u9645(), step=step, col=col, unit=unit, alt=alt, line=line, solid=solid);
ldraw_lib__u9645(line=0.2);
